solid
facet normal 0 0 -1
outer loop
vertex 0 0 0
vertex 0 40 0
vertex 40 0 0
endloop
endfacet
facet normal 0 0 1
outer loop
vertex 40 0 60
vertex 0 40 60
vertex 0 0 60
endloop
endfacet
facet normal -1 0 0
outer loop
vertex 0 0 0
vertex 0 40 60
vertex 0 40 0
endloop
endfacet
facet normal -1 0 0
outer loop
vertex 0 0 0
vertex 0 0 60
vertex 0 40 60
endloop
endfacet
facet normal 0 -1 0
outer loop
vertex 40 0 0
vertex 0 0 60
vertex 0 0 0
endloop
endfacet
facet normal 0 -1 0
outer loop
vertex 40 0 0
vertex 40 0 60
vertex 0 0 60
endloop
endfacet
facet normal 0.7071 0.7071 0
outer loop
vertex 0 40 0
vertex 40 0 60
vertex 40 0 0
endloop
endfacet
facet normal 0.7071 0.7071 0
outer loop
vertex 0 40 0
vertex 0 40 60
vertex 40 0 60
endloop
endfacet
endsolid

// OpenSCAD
// Triangular prism generator
/****************************
 * User parameters
 ****************************/
base = 40;     // right triangle legs length
height = 60;   // extrusion height
center_prism = false;

/****************************
 * Assembly
 ****************************/
module prism_generator() {
    translate(center_prism ? [-base/2, -base/2, 0] : [0,0,0])
    linear_extrude(height=height)
        polygon(points=[[0,0],[base,0],[0,base]]);
}

prism_generator();
